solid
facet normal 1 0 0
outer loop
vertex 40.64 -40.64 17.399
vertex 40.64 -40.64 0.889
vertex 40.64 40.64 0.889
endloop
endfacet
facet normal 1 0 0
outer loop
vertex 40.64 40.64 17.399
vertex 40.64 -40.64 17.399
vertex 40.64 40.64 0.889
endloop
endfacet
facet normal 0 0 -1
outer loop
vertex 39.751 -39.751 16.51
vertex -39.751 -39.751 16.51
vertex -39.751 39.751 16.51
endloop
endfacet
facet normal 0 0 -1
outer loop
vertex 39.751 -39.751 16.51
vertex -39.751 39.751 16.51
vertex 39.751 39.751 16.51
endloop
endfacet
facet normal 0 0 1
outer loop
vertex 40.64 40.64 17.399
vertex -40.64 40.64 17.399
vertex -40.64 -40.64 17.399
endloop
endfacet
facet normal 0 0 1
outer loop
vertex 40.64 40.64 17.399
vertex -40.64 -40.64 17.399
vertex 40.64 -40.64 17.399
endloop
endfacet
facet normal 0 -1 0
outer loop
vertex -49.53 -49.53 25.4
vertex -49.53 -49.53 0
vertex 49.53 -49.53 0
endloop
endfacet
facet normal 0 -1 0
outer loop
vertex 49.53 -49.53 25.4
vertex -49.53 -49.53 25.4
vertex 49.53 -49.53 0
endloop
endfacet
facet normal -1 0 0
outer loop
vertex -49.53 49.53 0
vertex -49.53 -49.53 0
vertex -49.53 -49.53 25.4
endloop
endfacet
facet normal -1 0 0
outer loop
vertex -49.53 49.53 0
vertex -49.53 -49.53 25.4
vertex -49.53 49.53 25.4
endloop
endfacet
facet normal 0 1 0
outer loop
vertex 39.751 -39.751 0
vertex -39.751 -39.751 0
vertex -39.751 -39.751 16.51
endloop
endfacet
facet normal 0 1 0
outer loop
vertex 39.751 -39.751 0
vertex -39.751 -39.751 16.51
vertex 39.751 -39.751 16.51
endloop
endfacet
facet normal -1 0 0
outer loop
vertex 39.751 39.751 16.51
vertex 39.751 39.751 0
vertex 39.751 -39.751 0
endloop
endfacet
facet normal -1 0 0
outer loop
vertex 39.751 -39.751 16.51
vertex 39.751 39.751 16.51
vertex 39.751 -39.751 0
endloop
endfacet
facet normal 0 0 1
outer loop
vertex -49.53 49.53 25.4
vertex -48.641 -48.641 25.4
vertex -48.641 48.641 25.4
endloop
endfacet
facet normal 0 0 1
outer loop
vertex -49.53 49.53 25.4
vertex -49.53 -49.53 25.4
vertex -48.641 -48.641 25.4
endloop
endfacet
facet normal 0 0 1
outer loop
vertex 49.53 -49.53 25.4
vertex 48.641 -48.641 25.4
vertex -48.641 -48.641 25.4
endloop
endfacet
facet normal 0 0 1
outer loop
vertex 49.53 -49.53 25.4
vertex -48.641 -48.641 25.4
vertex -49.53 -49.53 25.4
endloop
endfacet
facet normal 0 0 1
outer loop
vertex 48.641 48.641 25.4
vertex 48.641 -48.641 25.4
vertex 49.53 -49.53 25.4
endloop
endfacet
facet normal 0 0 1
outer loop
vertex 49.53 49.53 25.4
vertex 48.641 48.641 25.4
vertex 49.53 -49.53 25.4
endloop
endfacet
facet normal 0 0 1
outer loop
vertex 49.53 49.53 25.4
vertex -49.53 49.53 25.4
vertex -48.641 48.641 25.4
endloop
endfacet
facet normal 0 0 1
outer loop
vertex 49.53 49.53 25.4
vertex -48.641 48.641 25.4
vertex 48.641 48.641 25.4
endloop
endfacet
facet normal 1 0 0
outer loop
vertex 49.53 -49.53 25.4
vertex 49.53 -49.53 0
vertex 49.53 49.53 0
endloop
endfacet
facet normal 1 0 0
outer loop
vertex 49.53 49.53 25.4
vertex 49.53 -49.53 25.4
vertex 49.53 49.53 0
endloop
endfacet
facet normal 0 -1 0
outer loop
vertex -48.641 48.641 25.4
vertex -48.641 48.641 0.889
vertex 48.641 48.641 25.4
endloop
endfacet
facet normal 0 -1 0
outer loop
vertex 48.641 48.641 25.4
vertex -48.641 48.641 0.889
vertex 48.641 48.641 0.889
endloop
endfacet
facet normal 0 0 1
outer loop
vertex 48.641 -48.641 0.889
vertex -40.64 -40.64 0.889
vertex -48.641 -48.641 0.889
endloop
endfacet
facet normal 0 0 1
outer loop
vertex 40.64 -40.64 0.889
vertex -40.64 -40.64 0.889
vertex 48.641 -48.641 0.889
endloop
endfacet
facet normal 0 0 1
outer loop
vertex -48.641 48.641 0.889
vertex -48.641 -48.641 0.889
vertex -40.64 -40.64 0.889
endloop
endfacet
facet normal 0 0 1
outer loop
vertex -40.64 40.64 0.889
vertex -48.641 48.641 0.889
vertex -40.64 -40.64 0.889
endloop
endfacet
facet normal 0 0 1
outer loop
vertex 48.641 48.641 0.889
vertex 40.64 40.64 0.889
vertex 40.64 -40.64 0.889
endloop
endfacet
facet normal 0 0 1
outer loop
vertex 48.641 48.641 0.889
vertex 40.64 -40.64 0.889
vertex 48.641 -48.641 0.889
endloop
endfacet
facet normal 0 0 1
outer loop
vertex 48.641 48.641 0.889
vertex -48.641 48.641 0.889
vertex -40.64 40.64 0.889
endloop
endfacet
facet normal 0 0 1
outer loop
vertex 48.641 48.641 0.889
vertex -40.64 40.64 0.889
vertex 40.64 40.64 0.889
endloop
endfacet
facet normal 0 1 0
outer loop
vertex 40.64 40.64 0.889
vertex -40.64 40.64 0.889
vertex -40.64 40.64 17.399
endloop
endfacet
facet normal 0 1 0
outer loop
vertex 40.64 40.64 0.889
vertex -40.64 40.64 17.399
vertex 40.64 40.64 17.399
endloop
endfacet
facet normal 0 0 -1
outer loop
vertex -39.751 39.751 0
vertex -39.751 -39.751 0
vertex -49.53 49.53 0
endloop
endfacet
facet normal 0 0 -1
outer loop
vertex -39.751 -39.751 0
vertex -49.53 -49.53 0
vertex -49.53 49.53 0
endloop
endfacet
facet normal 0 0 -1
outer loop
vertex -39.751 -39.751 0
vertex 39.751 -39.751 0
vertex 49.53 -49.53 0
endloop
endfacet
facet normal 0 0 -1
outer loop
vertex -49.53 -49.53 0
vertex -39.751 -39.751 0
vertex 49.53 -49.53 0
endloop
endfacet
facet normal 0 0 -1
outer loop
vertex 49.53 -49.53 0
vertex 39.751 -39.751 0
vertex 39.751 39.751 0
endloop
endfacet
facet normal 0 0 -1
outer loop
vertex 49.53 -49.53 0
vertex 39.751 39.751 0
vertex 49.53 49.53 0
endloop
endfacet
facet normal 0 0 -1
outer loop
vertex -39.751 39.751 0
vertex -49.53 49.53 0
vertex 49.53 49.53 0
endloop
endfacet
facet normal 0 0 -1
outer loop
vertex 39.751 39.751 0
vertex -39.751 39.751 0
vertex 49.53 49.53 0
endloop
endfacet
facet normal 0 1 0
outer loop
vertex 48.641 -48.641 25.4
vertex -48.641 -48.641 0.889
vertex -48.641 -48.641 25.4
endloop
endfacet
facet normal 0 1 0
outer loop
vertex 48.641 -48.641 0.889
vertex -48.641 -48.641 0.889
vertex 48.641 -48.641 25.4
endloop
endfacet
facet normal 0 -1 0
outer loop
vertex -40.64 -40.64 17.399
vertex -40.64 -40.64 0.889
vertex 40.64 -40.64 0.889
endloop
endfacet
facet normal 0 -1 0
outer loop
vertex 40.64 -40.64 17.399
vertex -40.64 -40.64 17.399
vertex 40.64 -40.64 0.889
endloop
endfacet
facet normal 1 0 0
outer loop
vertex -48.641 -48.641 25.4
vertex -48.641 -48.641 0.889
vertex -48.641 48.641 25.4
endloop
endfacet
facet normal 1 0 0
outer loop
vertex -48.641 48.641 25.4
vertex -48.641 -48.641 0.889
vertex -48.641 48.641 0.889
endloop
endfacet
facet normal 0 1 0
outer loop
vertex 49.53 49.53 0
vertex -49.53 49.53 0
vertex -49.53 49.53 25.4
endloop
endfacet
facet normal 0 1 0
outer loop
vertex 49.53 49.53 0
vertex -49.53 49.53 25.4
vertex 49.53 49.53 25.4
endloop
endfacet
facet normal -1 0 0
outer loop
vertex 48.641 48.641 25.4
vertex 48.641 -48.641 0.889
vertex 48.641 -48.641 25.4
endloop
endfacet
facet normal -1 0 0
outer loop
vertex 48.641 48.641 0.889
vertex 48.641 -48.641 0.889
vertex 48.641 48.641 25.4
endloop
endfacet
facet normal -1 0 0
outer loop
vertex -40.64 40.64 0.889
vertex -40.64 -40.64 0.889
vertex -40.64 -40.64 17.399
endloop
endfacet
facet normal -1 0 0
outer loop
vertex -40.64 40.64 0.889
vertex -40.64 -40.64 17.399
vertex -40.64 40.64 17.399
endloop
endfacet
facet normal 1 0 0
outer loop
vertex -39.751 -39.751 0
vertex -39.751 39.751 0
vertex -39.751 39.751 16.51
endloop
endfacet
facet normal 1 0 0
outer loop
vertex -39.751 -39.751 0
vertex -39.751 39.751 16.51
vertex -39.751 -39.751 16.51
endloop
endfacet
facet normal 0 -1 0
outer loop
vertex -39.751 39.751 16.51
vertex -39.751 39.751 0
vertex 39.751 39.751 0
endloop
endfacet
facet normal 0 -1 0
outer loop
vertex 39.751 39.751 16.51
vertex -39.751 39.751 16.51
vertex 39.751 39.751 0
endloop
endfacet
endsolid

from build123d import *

# Parameters (mm, degrees)
F0_W     = 99.06
F0_H     = 99.06
F1_DEPTH = 25.4
F2_T     = -0.889
F3_W     = 81.28
F3_H     = 81.28
F4_DEPTH = 16.51
F5_W     = 79.502
F5_H     = 79.502
F6_DEPTH = 16.51


with BuildPart() as f1:
    # F0 (on Top) → F1 (new body)
    with BuildSketch(Plane.XY):
        Rectangle(F0_W, F0_H)
    extrude(amount=F1_DEPTH)

    # F2
    f2_openings = [f1.faces().sort_by_distance(p)[0] for p in [
        (0, 0, 25.4),
    ]]
    offset(amount=F2_T, openings=f2_openings)

    # F3 (on face) → F4 (join)
    with BuildSketch(Plane.XY.offset(0.889)):
        Rectangle(F3_W, F3_H)
    extrude(amount=F4_DEPTH)

    # F5 (on face) → F6 (cut)
    with BuildSketch(Plane(origin=(0, 0, 0), x_dir=(1, 0, 0), z_dir=(0, 0, -1))):
        Rectangle(F5_W, F5_H)
    extrude(amount=-F6_DEPTH, mode=Mode.SUBTRACT)


solid = f1.part
